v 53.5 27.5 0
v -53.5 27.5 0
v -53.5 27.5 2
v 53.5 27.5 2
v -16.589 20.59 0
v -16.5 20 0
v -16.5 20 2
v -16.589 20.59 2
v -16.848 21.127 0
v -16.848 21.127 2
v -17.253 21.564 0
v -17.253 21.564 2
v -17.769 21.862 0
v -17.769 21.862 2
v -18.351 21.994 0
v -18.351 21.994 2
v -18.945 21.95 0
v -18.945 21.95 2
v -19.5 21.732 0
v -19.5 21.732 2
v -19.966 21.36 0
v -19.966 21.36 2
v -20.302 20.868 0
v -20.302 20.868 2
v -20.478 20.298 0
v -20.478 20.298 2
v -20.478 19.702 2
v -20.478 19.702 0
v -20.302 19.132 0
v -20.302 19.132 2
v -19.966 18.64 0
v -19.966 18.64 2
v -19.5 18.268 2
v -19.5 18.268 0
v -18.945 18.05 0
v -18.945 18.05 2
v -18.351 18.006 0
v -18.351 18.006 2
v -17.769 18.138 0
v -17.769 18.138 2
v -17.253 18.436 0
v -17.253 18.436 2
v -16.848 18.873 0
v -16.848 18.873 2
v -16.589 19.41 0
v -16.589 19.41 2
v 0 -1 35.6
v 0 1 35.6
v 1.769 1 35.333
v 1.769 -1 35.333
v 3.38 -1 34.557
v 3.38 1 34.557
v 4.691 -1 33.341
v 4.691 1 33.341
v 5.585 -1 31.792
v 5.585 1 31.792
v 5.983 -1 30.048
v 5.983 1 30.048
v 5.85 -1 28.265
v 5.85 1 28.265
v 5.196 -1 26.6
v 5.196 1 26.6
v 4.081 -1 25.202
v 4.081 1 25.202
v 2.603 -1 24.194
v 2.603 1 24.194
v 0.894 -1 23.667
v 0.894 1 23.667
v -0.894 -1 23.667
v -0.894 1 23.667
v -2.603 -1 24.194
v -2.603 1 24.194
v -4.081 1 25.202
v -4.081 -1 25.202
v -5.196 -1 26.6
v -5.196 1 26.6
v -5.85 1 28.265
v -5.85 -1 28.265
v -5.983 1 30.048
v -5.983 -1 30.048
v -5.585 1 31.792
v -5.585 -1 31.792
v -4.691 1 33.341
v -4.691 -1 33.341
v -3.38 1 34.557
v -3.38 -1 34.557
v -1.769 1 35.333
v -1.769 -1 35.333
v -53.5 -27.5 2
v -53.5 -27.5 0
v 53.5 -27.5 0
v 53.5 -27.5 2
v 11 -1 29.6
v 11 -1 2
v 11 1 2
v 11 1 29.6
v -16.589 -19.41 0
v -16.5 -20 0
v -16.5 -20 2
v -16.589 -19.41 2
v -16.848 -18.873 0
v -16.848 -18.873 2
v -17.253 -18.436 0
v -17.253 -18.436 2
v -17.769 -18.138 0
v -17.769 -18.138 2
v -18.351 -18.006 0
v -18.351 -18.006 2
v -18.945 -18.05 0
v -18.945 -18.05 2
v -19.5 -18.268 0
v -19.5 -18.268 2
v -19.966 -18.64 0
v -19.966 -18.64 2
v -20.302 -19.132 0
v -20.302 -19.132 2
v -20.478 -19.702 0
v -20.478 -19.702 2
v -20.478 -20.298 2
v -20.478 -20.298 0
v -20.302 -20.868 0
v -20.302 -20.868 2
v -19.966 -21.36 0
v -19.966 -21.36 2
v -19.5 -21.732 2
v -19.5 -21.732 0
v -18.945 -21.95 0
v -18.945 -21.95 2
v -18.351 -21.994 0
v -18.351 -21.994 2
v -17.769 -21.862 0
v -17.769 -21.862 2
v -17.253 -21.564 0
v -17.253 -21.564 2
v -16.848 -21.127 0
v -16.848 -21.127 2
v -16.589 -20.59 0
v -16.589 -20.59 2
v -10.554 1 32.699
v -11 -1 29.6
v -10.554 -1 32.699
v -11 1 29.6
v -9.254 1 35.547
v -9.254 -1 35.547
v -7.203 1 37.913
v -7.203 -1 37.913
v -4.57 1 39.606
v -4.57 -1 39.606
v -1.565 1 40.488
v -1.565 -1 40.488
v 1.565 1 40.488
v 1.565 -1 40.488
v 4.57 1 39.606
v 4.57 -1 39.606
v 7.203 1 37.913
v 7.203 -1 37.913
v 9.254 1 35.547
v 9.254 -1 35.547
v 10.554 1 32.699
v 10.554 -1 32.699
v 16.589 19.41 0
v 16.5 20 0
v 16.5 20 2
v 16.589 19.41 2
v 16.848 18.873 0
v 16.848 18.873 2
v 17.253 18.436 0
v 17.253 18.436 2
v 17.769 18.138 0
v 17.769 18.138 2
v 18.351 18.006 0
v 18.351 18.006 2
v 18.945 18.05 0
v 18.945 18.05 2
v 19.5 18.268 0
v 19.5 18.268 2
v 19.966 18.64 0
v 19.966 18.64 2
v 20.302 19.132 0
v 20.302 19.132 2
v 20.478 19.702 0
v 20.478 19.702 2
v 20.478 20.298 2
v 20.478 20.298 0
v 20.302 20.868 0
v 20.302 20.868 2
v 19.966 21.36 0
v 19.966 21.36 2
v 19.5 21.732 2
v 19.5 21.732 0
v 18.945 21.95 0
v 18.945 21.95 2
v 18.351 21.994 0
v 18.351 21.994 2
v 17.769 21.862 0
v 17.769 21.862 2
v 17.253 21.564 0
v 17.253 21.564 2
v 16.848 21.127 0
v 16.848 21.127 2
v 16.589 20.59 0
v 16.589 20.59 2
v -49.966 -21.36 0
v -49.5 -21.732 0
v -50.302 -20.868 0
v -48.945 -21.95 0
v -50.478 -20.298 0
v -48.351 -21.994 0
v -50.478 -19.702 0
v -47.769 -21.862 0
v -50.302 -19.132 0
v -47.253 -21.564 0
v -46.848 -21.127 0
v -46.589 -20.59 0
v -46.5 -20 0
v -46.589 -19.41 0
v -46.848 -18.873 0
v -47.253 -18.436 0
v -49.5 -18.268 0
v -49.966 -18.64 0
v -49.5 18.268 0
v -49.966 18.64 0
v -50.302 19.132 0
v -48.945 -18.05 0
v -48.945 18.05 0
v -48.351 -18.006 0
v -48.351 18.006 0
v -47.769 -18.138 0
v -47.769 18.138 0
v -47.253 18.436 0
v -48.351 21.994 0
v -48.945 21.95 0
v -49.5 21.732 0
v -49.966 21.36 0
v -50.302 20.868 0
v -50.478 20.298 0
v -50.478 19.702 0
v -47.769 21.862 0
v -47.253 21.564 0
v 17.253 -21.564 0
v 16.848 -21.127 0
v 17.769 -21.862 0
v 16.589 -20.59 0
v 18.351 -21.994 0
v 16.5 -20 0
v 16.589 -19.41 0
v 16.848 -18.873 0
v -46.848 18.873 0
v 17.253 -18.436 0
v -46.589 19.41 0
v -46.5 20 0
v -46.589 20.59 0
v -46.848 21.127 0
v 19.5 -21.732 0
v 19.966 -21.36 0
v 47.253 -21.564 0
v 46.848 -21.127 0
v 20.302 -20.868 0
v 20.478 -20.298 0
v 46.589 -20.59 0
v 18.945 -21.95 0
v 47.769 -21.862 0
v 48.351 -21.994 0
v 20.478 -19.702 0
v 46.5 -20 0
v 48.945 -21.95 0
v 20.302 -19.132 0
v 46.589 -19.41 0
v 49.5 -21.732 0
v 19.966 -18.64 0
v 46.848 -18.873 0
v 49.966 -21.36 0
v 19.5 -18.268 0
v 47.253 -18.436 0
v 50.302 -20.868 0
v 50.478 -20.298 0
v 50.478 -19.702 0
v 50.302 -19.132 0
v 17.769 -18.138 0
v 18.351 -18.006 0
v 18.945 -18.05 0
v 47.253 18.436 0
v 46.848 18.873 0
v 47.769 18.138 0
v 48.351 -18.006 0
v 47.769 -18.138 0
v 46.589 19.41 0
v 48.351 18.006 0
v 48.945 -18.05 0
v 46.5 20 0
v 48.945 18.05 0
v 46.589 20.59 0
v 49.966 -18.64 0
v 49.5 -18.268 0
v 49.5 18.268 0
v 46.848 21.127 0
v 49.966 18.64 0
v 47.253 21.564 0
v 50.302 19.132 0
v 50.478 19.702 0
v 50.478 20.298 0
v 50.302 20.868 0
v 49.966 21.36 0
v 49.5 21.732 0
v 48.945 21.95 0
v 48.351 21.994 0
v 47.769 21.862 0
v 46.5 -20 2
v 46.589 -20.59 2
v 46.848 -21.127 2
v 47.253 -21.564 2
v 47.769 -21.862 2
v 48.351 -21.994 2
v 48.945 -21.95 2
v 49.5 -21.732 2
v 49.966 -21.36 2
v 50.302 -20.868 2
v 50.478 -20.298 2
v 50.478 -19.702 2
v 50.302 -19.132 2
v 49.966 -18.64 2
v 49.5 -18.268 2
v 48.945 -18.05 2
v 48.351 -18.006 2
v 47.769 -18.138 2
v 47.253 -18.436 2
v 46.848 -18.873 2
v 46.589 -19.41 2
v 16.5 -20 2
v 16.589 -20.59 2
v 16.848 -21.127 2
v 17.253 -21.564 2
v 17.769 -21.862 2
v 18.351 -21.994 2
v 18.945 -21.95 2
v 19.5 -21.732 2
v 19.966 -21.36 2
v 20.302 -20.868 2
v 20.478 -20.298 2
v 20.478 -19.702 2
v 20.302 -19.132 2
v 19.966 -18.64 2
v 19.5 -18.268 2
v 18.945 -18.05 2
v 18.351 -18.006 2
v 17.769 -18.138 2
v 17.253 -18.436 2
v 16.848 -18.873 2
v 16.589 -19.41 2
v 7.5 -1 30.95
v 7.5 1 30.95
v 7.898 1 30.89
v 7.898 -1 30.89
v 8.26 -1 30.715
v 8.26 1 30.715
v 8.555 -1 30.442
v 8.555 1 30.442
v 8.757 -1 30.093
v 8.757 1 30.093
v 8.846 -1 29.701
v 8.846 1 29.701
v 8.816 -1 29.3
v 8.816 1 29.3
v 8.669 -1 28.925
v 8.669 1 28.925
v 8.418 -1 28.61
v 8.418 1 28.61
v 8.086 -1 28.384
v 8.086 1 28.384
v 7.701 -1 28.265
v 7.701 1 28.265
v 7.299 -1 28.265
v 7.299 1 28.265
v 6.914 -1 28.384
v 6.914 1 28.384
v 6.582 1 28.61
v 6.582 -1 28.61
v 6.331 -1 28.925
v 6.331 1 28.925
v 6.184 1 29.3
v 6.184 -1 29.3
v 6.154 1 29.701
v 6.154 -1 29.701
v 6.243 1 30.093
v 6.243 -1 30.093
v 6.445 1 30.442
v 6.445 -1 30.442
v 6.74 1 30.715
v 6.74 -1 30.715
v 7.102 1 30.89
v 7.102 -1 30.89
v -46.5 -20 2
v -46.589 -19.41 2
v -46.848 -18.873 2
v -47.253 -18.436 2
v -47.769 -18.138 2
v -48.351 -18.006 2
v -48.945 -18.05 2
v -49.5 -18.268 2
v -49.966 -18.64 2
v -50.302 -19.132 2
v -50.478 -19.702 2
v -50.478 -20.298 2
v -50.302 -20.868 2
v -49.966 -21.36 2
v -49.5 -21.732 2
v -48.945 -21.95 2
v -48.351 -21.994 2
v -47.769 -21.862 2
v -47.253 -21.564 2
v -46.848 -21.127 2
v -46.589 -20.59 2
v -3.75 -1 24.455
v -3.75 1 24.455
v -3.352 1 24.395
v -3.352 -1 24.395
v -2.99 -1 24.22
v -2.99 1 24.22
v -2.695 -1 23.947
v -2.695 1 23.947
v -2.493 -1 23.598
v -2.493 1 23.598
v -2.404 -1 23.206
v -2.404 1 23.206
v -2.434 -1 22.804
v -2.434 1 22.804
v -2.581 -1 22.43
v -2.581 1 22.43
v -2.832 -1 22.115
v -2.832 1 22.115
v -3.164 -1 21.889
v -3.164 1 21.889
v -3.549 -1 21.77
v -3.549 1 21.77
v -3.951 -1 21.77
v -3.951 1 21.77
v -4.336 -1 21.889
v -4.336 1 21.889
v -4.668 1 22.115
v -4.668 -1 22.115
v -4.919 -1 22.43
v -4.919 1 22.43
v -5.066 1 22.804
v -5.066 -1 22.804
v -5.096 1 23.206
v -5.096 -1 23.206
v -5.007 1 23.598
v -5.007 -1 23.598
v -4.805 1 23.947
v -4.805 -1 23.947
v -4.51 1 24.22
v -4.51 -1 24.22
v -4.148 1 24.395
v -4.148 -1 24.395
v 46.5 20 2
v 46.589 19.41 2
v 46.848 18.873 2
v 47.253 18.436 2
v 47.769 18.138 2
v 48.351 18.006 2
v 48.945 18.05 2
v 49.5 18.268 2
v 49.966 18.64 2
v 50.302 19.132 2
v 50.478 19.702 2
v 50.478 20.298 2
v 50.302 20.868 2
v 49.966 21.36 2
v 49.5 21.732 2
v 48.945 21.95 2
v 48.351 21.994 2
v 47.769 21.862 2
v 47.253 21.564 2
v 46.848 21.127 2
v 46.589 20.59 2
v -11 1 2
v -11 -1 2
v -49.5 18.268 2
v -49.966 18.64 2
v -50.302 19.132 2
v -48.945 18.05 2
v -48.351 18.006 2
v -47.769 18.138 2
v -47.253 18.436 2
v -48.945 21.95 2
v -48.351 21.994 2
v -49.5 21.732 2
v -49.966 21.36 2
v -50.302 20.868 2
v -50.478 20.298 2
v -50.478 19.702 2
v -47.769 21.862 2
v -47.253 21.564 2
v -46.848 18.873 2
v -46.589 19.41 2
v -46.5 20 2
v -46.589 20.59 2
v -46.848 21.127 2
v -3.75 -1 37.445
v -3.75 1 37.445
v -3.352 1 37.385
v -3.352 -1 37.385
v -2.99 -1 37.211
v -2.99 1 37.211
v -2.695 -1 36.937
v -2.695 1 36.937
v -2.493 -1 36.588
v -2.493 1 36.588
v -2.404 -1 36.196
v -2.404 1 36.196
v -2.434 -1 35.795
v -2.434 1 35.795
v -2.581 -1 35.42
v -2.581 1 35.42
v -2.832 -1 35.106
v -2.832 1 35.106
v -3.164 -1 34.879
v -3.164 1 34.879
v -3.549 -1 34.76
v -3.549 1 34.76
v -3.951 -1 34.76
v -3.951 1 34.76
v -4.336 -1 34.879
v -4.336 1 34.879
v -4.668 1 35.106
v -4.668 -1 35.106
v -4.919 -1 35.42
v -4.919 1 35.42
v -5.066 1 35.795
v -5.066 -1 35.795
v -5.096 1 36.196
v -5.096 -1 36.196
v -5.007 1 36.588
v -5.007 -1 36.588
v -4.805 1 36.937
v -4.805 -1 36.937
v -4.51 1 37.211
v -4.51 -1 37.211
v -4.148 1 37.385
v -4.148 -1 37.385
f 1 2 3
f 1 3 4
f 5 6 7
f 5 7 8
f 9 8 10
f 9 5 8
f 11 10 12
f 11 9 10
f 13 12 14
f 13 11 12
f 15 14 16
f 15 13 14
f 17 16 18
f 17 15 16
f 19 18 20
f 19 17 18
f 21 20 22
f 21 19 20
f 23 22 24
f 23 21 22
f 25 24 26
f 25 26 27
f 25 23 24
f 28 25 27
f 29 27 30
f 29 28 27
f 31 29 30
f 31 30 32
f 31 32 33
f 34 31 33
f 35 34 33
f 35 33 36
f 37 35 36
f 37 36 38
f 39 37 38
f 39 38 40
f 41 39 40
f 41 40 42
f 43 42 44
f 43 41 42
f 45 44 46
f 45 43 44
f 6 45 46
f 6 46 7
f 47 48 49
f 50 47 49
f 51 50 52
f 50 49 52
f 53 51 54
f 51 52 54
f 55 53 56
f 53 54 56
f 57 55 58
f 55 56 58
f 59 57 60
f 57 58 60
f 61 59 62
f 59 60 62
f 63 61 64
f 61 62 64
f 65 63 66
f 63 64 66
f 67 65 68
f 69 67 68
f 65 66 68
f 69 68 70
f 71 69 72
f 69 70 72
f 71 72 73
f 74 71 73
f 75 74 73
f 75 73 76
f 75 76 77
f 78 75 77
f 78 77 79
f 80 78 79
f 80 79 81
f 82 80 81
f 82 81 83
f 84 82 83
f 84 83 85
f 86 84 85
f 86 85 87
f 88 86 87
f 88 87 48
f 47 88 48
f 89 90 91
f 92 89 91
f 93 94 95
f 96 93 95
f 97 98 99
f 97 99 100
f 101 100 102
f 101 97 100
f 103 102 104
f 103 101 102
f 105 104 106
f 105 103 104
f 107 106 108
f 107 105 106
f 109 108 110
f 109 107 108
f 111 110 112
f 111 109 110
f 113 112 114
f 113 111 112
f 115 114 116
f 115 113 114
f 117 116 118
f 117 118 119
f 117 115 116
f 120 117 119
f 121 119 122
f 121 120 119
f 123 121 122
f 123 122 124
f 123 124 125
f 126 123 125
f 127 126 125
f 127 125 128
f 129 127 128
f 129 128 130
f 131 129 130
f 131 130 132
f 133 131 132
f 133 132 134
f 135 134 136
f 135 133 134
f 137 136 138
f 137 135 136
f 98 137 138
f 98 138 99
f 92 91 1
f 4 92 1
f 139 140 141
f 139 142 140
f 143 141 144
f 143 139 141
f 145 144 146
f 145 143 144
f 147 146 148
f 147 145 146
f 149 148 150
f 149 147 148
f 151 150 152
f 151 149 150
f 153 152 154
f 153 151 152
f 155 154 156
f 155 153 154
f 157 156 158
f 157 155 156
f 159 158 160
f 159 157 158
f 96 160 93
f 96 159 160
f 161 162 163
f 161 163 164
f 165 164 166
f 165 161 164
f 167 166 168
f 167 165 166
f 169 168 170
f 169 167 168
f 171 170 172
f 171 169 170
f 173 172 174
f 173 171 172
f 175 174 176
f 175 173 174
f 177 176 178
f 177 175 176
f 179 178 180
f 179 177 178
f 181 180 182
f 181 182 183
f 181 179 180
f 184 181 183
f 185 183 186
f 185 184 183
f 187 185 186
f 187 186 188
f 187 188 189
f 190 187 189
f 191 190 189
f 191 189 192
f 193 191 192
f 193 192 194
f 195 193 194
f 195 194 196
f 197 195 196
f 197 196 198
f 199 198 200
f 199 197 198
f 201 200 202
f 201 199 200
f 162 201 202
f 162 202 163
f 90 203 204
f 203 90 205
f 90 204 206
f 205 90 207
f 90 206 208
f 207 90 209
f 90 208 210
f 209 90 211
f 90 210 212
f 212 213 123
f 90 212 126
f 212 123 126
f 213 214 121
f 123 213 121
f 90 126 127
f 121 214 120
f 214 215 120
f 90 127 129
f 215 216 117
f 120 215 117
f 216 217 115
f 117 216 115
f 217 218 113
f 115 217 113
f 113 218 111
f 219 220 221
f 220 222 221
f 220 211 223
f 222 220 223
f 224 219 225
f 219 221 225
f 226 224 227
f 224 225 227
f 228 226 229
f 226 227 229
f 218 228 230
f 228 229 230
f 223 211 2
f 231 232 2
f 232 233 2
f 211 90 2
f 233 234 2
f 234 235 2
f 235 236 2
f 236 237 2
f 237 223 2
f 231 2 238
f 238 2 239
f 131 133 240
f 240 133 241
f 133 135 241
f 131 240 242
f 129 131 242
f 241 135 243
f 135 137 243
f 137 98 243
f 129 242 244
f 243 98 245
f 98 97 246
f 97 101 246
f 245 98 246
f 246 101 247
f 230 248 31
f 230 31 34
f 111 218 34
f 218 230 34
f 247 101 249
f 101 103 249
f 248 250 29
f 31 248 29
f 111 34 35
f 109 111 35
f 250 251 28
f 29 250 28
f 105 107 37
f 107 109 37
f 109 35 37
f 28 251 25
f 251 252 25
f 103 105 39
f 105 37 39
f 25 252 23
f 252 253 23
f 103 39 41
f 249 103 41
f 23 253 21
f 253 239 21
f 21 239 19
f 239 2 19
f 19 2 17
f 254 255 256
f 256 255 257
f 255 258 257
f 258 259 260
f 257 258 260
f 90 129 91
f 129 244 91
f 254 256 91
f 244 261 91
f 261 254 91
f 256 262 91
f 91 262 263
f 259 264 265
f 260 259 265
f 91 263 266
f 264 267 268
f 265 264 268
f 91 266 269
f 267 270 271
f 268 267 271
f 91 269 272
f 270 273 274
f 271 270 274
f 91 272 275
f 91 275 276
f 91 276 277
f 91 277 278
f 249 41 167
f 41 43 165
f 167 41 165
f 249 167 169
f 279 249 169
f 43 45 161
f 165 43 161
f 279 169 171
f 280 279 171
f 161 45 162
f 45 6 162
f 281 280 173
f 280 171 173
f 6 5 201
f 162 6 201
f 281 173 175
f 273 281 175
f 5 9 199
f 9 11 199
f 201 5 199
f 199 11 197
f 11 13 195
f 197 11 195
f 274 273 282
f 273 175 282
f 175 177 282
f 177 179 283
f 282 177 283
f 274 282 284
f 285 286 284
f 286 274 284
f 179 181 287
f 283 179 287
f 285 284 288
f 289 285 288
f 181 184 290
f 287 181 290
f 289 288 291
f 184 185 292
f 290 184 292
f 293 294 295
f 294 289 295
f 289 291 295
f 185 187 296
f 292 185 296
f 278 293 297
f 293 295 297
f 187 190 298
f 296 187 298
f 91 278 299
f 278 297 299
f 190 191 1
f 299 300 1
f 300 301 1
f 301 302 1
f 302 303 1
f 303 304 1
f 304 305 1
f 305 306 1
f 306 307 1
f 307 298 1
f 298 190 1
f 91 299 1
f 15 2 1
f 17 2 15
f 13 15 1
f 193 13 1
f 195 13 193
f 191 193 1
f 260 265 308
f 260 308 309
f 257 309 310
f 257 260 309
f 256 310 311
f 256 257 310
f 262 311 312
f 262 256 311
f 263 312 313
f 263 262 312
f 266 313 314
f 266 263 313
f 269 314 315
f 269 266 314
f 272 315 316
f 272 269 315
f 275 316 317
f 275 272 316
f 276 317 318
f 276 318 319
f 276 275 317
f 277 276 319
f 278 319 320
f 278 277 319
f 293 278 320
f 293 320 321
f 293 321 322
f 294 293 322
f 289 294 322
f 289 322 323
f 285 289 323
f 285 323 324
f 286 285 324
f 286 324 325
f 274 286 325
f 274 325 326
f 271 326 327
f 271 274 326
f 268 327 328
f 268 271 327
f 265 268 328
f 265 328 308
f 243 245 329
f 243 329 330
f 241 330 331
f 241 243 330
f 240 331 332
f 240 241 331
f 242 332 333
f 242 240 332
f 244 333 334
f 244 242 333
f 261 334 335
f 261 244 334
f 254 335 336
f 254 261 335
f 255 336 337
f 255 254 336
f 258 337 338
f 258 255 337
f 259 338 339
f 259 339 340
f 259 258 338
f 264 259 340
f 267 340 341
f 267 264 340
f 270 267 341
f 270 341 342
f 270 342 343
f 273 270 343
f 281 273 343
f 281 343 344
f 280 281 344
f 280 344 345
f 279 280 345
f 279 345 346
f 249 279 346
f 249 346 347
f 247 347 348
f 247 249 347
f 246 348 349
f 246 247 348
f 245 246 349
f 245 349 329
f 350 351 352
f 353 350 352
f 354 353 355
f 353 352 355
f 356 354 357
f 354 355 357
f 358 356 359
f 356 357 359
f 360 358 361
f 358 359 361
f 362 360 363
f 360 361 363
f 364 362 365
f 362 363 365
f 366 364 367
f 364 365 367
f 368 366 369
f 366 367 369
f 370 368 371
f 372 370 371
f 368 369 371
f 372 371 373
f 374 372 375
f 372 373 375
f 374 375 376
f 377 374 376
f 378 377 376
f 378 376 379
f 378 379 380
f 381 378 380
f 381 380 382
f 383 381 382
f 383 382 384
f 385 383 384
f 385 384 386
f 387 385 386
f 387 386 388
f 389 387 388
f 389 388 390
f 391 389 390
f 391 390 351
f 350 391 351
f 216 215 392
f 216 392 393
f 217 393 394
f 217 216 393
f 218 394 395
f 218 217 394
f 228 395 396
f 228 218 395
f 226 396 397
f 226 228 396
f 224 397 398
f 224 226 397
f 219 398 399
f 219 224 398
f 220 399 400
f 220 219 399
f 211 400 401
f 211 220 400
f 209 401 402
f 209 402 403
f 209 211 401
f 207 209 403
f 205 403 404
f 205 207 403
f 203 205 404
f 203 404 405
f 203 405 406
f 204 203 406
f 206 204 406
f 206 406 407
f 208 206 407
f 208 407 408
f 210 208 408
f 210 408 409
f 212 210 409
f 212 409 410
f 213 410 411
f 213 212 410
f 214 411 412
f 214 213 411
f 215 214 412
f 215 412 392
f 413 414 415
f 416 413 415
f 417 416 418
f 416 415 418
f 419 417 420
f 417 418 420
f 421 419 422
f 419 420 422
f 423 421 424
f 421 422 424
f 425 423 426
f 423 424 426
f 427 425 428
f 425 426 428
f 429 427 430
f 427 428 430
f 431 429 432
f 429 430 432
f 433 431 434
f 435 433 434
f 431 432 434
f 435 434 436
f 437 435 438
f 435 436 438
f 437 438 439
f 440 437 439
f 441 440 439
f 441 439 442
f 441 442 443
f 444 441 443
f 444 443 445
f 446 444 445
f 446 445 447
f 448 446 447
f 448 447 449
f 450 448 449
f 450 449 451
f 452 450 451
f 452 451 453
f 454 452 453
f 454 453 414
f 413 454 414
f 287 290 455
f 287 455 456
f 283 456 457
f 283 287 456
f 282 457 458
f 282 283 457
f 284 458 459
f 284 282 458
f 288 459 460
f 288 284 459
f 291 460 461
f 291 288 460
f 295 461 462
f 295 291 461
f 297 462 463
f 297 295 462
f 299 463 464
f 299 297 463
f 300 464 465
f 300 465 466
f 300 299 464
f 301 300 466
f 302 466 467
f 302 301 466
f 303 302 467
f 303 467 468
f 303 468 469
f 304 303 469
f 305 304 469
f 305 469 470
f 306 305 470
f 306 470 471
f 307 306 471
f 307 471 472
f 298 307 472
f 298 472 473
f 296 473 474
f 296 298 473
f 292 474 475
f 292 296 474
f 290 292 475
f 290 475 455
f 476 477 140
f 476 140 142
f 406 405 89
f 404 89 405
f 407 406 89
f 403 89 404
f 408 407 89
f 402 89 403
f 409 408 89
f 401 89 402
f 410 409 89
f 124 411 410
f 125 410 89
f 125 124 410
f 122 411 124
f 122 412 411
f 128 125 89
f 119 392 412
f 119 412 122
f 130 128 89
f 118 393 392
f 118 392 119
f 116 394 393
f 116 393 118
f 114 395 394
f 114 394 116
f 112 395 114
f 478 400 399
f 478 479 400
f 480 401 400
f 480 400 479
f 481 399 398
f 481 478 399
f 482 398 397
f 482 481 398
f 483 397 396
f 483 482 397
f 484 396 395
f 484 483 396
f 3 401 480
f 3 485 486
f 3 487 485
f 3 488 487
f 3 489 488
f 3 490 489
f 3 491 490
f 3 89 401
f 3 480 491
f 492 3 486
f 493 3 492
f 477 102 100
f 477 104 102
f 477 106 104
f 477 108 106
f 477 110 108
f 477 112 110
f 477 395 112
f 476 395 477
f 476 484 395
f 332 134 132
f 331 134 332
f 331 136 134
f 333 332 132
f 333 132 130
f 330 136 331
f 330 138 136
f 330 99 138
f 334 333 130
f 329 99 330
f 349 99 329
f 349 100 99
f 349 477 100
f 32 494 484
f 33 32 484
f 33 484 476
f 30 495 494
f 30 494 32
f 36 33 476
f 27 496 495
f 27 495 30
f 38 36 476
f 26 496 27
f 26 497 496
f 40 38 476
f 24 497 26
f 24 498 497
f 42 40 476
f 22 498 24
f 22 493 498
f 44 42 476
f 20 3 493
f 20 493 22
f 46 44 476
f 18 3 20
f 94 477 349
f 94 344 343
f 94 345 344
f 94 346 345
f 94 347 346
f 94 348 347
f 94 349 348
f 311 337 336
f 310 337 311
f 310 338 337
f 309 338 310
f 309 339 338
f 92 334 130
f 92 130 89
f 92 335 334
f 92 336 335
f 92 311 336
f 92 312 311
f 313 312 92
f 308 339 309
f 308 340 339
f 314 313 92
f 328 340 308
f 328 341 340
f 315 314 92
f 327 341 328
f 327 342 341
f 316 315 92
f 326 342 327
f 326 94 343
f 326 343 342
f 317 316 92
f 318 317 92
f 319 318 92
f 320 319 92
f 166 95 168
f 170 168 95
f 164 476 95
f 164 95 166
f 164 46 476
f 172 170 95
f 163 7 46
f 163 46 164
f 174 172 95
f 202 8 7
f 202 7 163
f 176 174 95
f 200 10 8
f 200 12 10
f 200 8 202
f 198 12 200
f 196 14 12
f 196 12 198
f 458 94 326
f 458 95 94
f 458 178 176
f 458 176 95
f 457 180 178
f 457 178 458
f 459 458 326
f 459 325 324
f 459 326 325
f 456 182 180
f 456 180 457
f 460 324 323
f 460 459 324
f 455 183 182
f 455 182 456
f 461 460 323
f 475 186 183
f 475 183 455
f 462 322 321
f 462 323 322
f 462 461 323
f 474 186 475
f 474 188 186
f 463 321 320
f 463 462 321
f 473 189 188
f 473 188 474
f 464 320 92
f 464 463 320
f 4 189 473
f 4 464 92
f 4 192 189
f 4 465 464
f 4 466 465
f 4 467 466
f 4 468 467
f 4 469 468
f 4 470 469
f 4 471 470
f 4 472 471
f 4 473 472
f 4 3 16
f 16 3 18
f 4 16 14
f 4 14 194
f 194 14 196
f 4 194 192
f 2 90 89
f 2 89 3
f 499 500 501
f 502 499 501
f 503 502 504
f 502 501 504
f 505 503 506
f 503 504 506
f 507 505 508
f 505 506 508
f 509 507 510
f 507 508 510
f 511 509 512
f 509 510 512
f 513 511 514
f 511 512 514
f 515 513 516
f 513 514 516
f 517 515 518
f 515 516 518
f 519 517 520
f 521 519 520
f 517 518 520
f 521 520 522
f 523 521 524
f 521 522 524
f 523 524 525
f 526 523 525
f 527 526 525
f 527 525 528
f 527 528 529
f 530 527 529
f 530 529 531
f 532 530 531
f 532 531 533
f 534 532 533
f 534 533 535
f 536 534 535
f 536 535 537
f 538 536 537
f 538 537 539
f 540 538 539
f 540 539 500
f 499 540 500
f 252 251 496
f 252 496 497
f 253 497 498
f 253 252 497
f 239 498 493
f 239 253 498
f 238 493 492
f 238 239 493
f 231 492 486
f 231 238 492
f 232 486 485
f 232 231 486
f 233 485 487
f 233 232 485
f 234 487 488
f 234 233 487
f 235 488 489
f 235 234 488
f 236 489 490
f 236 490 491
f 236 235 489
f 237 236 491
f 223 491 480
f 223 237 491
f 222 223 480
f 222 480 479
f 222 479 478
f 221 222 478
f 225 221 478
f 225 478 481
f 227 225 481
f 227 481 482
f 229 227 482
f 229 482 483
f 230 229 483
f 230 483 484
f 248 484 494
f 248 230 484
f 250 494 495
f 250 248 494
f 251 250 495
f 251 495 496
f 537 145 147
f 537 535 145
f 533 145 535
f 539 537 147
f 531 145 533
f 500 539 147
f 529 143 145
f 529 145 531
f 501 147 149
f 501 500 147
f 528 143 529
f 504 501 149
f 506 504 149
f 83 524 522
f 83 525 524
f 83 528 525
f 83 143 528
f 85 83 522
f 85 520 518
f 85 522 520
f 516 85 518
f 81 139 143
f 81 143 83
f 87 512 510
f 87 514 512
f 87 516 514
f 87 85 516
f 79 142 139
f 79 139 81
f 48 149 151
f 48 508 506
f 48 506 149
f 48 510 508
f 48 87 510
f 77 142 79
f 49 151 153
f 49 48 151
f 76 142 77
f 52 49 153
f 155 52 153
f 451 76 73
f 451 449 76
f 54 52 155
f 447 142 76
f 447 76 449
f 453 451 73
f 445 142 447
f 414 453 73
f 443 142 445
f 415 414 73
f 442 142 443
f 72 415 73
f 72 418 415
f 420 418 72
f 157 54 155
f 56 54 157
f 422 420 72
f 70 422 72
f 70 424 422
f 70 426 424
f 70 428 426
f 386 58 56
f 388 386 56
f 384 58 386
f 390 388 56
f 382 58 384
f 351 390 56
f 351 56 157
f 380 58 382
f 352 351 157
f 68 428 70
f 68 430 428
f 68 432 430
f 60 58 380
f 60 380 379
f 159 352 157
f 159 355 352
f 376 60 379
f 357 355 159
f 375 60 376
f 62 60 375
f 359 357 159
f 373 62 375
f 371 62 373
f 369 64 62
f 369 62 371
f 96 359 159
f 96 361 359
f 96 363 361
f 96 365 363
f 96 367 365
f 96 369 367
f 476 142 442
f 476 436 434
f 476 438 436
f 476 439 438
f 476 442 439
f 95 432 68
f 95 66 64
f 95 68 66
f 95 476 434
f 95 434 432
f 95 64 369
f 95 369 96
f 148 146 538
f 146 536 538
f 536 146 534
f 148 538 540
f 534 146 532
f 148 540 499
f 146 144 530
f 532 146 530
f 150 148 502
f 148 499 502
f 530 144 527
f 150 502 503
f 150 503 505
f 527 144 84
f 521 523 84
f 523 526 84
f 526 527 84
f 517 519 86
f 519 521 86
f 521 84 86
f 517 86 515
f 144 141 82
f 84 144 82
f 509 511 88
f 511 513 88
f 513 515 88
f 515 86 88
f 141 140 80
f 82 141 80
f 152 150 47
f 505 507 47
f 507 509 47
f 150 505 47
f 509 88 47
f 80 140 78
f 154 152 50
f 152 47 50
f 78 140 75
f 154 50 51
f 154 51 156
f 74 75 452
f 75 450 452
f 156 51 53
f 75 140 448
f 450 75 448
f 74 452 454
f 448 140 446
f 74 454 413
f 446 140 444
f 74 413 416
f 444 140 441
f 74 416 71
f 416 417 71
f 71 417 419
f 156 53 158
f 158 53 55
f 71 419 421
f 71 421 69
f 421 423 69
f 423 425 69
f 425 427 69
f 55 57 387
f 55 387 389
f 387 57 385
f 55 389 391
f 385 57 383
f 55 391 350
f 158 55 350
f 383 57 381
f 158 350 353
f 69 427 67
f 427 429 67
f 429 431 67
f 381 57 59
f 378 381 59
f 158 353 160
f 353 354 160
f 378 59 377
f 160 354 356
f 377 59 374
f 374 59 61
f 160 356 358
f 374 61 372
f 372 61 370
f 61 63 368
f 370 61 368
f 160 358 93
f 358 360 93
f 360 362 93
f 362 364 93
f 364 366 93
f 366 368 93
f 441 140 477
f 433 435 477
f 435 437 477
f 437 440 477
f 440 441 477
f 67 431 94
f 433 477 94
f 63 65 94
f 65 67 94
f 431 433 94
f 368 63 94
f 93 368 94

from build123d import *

# Parameters (mm, degrees)
CROQUIS1_W              = 107
CROQUIS1_H              = 55
CROQUIS1_R              = 2
SALIENTE_EXTRUIR1_DEPTH = 2
CROQUIS2_W              = 22
CROQUIS2_H              = 2
SALIENTE_EXTRUIR2_DEPTH = 27.6
CROQUIS3_R              = 11
SALIENTE_EXTRUIR3_DEPTH = 2
CROQUIS4_R              = 6
CORTAR_EXTRUIR1_DEPTH   = 187.15
CROQUIS6_R              = 1.35
CORTAR_EXTRUIR2_DEPTH   = 187.15


with BuildPart() as part:
    # Croquis1 → Saliente-Extruir1 (new body)
    with BuildSketch(Plane.XY):
        Rectangle(CROQUIS1_W, CROQUIS1_H)
        with Locations((-48.5, 20)):
            Circle(CROQUIS1_R, mode=Mode.SUBTRACT)
        with Locations((-48.5, -20)):
            Circle(CROQUIS1_R, mode=Mode.SUBTRACT)
        with Locations((-18.5, 20)):
            Circle(CROQUIS1_R, mode=Mode.SUBTRACT)
        with Locations((-18.5, -20)):
            Circle(CROQUIS1_R, mode=Mode.SUBTRACT)
        with Locations(Location((48.5, -20, 0), (0, 0, 180))):
            Circle(CROQUIS1_R, mode=Mode.SUBTRACT)
        with Locations(Location((18.5, -20, 0), (0, 0, 180))):
            Circle(CROQUIS1_R, mode=Mode.SUBTRACT)
        with Locations(Location((18.5, 20, 0), (0, 0, 180))):
            Circle(CROQUIS1_R, mode=Mode.SUBTRACT)
        with Locations(Location((48.5, 20, 0), (0, 0, 180))):
            Circle(CROQUIS1_R, mode=Mode.SUBTRACT)
    extrude(amount=SALIENTE_EXTRUIR1_DEPTH)

    # Croquis2 → Saliente-Extruir2 (add)
    with BuildSketch(Plane(origin=(0, 0, 2), x_dir=(-1, 0, 0), z_dir=(0, 0, -1))):
        Rectangle(CROQUIS2_W, CROQUIS2_H)
    extrude(amount=-SALIENTE_EXTRUIR2_DEPTH)

    # Croquis3 → Saliente-Extruir3 (add)
    with BuildSketch(Plane(origin=(0, 1, 0), x_dir=(1, 0, 0), z_dir=(0, 1, 0))):
        with Locations((0, -29.6)):
            Circle(CROQUIS3_R)
    extrude(amount=-SALIENTE_EXTRUIR3_DEPTH)

    # Croquis4 → Cortar-Extruir1 (cut)
    with BuildSketch(Plane(origin=(0, 1, 0), x_dir=(1, 0, 0), z_dir=(0, 1, 0))):
        with Locations(Location((0, -29.6, 0), (0, 0, 270))):
            Circle(CROQUIS4_R)
    extrude(amount=-CORTAR_EXTRUIR1_DEPTH, mode=Mode.SUBTRACT)

    # Croquis6 → Cortar-Extruir2 (cut)
    with BuildSketch(Plane(origin=(0, 1, 0), x_dir=(1, 0, 0), z_dir=(0, 1, 0))):
        with Locations(Location((7.5, -29.6, 0), (0, 0, 270))):
            Circle(CROQUIS6_R)
        with Locations(Location((-3.75, -36.095190528, 0), (0, 0, 270))):
            Circle(CROQUIS6_R)
        with Locations(Location((-3.75, -23.104809472, 0), (0, 0, 270))):
            Circle(CROQUIS6_R)
    extrude(amount=-CORTAR_EXTRUIR2_DEPTH, mode=Mode.SUBTRACT)


solid = part.part
